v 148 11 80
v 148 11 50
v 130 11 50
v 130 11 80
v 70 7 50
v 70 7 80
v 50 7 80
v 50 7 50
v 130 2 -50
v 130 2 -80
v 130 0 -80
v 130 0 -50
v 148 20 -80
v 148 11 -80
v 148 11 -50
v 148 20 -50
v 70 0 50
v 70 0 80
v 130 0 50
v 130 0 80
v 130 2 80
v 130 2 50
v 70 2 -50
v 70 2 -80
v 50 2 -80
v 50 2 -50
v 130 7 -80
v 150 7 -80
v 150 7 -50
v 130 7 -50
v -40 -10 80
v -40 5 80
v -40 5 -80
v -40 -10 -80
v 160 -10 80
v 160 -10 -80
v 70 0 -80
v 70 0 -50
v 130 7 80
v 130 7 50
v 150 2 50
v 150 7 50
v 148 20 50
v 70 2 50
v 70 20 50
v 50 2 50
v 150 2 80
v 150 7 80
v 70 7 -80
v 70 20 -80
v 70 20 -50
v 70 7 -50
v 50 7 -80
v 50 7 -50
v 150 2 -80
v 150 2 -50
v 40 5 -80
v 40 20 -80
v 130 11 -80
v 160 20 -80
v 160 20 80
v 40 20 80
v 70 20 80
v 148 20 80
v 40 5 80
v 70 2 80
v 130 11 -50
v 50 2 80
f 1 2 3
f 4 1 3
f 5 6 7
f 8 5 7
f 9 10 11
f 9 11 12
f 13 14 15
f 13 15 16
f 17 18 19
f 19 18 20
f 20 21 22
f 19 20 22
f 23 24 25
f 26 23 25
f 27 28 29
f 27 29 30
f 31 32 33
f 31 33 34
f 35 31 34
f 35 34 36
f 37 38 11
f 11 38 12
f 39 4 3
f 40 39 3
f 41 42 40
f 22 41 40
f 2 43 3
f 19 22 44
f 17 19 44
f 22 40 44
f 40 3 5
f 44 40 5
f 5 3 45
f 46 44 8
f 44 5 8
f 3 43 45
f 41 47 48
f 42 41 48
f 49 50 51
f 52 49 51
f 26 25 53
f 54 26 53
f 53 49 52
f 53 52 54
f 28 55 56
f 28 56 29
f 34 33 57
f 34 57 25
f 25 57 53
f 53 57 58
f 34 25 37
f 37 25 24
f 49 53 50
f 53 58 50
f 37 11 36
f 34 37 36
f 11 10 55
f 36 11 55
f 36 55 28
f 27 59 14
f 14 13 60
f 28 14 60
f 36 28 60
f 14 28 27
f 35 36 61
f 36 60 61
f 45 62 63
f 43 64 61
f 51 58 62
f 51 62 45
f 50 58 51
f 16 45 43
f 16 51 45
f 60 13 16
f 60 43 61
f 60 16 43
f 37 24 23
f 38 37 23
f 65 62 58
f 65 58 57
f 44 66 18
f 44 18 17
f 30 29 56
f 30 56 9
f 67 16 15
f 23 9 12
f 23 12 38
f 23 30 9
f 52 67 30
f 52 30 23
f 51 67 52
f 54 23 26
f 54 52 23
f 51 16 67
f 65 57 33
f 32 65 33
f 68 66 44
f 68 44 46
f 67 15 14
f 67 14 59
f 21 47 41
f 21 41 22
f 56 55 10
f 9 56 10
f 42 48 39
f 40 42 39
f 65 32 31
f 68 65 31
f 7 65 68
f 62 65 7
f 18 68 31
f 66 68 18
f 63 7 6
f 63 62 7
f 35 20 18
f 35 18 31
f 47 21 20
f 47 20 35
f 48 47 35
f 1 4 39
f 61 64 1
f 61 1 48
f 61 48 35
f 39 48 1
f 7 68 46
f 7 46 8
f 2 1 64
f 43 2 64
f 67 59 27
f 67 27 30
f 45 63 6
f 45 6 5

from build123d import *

# Parameters (mm, degrees)
SKETCH1_W               = 320
SKETCH1_H               = 160
BOSS_EXTRUDE1_DEPTH     = 20
SKETCH2_W               = 60
SKETCH2_H               = 30
CUT_EXTRUDE1_DEPTH      = 28
SKETCH3_W               = 20
SKETCH3_H               = 5
CUT_EXTRUDE3_DEPTH      = 30
MIRROR3_COPY_1_SKETCH_W = 60
MIRROR3_COPY_1_SKETCH_H = 30
MIRROR3_COPY_1_DEPTH    = 28
MIRROR3_COPY_2_SKETCH_W = 20
MIRROR3_COPY_2_SKETCH_H = 5
MIRROR3_COPY_2_DEPTH    = 30
SKETCH8_W               = 18
SKETCH8_H               = 9
CUT_EXTRUDE6_DEPTH      = 30
SKETCH9_W               = 18
SKETCH9_H               = 9
CUT_EXTRUDE7_DEPTH      = 30
SKETCH10_W              = 320
SKETCH10_H              = 160
BOSS_EXTRUDE2_DEPTH     = 10
CUT_EXTRUDE8_DEPTH      = 236


with BuildPart() as part:
    # Sketch1 → Boss-Extrude1 (new body)
    with BuildSketch(Plane(origin=(0, 0, 0), x_dir=(1, 0, 0), z_dir=(0, 1, 0))):
        Rectangle(SKETCH1_W, SKETCH1_H)
    extrude(amount=BOSS_EXTRUDE1_DEPTH)

    # Sketch2 → Cut-Extrude1 (cut)
    with BuildSketch(Plane(origin=(0, 20, 0), x_dir=(1, 0, 0), z_dir=(0, 1, 0))):
        with Locations((-100, -65)):
            Rectangle(SKETCH2_W, SKETCH2_H)
    cut_extrude1 = extrude(amount=-CUT_EXTRUDE1_DEPTH, mode=Mode.SUBTRACT)

    # Sketch3 → Cut-Extrude3 (cut)
    with BuildSketch(Plane.XY.offset(80)):
        with Locations((-140, 4.5)):
            Rectangle(SKETCH3_W, SKETCH3_H)
        with Locations((-60, 4.5)):
            Rectangle(SKETCH3_W, SKETCH3_H)
    cut_extrude3 = extrude(amount=-CUT_EXTRUDE3_DEPTH, mode=Mode.SUBTRACT)

    # Mirror2: Cut-Extrude1, Cut-Extrude3 across plane
    add(cut_extrude1.mirror(Plane(origin=(0, 0, 0), x_dir=(0, 0, 1), z_dir=(1, 0, 0))), mode=Mode.SUBTRACT)
    add(cut_extrude3.mirror(Plane(origin=(0, 0, 0), x_dir=(0, 0, 1), z_dir=(1, 0, 0))), mode=Mode.SUBTRACT)

    # Mirror3: Cut-Extrude1, Cut-Extrude3 across plane
    add(cut_extrude1.mirror(Plane.XY), mode=Mode.SUBTRACT)
    add(cut_extrude3.mirror(Plane.XY), mode=Mode.SUBTRACT)

    # Mirror3 copy 1 sketch → Mirror3 copy 1 (cut)
    with BuildSketch(Plane(origin=(0, 20, 0), x_dir=(-1, 0, 0), z_dir=(0, 1, 0))):
        with Locations((-100, -65)):
            Rectangle(MIRROR3_COPY_1_SKETCH_W, MIRROR3_COPY_1_SKETCH_H)
    extrude(amount=-MIRROR3_COPY_1_DEPTH, mode=Mode.SUBTRACT)

    # Mirror3 copy 2 sketch → Mirror3 copy 2 (cut)
    with BuildSketch(Plane(origin=(0, 0, -80), x_dir=(-1, 0, 0), z_dir=(0, 0, -1))):
        with Locations((-140, 4.5)):
            Rectangle(MIRROR3_COPY_2_SKETCH_W, MIRROR3_COPY_2_SKETCH_H)
        with Locations((-60, 4.5)):
            Rectangle(MIRROR3_COPY_2_SKETCH_W, MIRROR3_COPY_2_SKETCH_H)
    extrude(amount=-MIRROR3_COPY_2_DEPTH, mode=Mode.SUBTRACT)

    # Sketch8 → Cut-Extrude6 (cut)
    with BuildSketch(Plane(origin=(0, 0, -80), x_dir=(-1, 0, 0), z_dir=(0, 0, -1))):
        with Locations((-139, 15.5)):
            Rectangle(SKETCH8_W, SKETCH8_H)
    cut_extrude6 = extrude(amount=-CUT_EXTRUDE6_DEPTH, mode=Mode.SUBTRACT)

    # Sketch9 → Cut-Extrude7 (cut)
    with BuildSketch(Plane(origin=(0, 0, -80), x_dir=(-1, 0, 0), z_dir=(0, 0, -1))):
        with Locations((61, 15.5)):
            Rectangle(SKETCH9_W, SKETCH9_H)
    cut_extrude7 = extrude(amount=-CUT_EXTRUDE7_DEPTH, mode=Mode.SUBTRACT)

    # Sketch10 → Boss-Extrude2 (add)
    with BuildSketch(Plane.XZ):
        Rectangle(SKETCH10_W, SKETCH10_H)
    extrude(amount=BOSS_EXTRUDE2_DEPTH)

    # Mirror4: Cut-Extrude6, Cut-Extrude7 across plane
    add(cut_extrude6.mirror(Plane.XY), mode=Mode.SUBTRACT)
    add(cut_extrude7.mirror(Plane.XY), mode=Mode.SUBTRACT)

    # Sketch12 → Cut-Extrude8 (cut)
    with BuildSketch(Plane(origin=(0, 0, -80), x_dir=(-1, 0, 0), z_dir=(0, 0, -1))):
        Polygon((-40, 20), (-40, 5), (40, 5), (40, -10), (160, -10), (160, 20), align=None)
    extrude(amount=-CUT_EXTRUDE8_DEPTH, mode=Mode.SUBTRACT)


solid = part.part
